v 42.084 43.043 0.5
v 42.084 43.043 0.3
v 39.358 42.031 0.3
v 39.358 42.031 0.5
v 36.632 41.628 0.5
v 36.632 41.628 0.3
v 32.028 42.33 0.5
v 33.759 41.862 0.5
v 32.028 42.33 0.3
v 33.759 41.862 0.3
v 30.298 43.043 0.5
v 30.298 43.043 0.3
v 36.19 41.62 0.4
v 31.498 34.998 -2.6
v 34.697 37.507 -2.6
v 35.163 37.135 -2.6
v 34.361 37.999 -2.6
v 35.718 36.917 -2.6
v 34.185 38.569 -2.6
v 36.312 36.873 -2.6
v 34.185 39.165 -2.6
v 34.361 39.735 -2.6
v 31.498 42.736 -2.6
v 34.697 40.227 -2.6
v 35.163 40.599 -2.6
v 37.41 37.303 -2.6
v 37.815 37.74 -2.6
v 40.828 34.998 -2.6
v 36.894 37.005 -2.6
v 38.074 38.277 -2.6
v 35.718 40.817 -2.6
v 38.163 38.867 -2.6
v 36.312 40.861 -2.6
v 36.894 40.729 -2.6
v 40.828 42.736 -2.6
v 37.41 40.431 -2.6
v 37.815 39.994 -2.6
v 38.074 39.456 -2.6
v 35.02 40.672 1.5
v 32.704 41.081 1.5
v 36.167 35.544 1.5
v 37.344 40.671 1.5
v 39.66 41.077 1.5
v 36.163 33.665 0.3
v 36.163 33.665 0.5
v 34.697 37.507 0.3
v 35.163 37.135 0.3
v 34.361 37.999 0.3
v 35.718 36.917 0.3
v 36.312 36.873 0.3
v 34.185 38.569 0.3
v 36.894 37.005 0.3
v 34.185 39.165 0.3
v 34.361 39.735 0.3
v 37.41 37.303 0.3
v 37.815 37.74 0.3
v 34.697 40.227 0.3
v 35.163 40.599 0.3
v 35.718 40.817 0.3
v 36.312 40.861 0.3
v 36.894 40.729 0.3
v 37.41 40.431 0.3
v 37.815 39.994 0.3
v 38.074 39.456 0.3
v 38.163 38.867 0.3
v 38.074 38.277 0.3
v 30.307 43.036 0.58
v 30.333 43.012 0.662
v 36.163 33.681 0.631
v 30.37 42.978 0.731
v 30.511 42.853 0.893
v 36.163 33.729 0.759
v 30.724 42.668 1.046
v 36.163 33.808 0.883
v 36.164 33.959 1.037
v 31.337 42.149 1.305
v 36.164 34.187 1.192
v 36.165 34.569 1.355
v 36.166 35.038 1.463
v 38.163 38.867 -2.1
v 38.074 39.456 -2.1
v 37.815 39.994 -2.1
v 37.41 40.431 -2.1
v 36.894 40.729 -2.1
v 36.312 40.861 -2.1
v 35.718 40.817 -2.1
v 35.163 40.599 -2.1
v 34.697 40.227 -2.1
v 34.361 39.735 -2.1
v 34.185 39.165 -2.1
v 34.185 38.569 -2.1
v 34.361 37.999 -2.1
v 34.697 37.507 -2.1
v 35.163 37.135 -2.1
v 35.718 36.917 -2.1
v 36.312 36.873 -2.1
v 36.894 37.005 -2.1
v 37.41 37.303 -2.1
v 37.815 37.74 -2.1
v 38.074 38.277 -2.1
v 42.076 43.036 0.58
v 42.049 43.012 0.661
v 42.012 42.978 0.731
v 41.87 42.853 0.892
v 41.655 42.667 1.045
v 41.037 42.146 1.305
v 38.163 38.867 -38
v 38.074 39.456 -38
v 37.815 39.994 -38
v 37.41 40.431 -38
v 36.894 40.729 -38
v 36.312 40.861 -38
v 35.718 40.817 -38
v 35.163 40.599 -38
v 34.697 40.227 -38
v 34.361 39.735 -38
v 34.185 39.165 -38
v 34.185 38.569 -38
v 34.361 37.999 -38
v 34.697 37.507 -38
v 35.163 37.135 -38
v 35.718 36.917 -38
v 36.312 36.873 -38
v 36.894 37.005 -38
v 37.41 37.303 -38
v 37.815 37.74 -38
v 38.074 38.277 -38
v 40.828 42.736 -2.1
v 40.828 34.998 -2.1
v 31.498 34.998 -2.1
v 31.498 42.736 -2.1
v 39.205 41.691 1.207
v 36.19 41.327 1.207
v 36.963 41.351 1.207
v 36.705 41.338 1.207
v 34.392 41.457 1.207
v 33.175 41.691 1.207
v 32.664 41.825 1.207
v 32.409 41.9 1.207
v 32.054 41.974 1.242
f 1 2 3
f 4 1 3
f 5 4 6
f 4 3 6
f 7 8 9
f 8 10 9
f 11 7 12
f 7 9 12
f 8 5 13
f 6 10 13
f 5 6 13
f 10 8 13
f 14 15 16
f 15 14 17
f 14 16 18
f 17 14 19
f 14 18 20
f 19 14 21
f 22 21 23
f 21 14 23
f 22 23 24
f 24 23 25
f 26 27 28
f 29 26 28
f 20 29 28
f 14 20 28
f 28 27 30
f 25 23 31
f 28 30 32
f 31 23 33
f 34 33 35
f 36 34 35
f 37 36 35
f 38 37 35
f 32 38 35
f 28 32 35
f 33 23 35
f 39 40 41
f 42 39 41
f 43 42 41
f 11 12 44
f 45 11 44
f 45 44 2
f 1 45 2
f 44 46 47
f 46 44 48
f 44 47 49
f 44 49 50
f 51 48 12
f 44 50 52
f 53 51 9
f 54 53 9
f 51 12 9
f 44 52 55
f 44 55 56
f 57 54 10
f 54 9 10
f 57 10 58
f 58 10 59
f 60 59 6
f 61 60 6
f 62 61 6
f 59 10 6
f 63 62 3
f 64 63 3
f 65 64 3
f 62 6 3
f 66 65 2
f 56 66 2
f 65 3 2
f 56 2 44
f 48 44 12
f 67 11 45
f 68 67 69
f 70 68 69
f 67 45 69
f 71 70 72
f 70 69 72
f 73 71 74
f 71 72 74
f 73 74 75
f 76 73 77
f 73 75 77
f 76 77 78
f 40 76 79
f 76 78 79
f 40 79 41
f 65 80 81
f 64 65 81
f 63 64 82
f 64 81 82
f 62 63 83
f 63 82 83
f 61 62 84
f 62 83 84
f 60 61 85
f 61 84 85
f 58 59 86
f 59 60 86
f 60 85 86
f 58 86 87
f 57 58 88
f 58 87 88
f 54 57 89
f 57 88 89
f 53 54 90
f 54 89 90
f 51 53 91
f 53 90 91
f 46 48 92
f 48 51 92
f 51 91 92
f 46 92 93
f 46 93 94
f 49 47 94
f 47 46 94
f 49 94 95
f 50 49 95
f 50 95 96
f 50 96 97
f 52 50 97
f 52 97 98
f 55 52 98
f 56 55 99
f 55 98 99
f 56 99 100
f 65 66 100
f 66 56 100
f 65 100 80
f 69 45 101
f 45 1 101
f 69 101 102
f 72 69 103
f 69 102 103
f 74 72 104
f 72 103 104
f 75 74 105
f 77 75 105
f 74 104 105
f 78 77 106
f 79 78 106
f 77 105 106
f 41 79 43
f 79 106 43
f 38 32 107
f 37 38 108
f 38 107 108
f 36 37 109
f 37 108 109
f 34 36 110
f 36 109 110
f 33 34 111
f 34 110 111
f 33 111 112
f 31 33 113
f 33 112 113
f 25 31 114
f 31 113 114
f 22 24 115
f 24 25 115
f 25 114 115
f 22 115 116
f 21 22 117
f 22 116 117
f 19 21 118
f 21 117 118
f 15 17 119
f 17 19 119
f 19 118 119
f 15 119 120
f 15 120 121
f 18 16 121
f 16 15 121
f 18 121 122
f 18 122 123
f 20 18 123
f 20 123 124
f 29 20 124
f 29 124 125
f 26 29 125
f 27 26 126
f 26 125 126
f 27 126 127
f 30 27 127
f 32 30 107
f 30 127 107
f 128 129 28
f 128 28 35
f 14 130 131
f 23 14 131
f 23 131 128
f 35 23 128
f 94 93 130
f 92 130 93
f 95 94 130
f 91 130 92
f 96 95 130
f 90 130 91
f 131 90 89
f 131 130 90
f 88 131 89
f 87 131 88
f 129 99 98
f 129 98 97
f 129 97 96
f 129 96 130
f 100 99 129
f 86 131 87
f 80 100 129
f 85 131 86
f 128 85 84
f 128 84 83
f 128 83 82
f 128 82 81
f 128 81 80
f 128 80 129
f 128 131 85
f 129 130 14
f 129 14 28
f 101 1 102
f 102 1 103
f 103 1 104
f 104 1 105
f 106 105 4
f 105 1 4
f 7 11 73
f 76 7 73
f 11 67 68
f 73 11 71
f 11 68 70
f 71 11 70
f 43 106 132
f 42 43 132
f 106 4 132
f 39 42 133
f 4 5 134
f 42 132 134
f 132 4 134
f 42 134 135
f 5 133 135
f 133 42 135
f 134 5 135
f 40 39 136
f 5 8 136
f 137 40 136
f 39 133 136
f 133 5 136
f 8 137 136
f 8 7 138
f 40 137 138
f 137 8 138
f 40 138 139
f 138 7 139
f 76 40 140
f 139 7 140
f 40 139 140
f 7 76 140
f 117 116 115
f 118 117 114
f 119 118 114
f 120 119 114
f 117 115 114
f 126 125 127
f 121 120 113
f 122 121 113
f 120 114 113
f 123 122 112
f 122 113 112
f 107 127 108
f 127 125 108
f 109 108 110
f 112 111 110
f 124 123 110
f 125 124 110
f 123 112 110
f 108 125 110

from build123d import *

# Parameters (mm, degrees)
BOSS_EXTRUDE1_DEPTH      = 0.5
BOSS_EXTRUDE1_DEPTH_BACK = 38
SKETCH1_R                = 2
BOSS_EXTRUDE2_DEPTH      = 1
BOSS_EXTRUDE2_DEPTH_BACK = 0.2
FILLET1_R                = 1
SKETCH3_W                = 9.33031097
SKETCH3_H                = 7.737675748
BOSS_EXTRUDE3_DEPTH      = 0.5


with BuildPart() as part:
    # Sketch1 → Boss-Extrude1 (new, two sides: drawn at the far end of the back side and taken through both)
    with BuildSketch(Plane.XY.offset(-BOSS_EXTRUDE1_DEPTH_BACK)):
        with Locations((36.163012657, 38.866961635)):
            Circle(SKETCH1_R)
    extrude(amount=BOSS_EXTRUDE1_DEPTH + BOSS_EXTRUDE1_DEPTH_BACK)

    # Sketch2 → Boss-Extrude2 (add, two sides: drawn at the far end of the back side and taken through both)
    with BuildSketch(Plane.XY.offset(0.5).offset(-BOSS_EXTRUDE2_DEPTH_BACK)):
        with BuildLine():
            Line((36.163012657, 33.665102482), (42.084431795, 43.04323939))
            add(Edge.make_bspline(
                [(42.084431795, 43.04323939), (36.188063939, 40.196898594), (30.297901751, 43.04323939)],
                knots=[0, 0, 0, 1, 1, 1], degree=2))
            Line((30.297901751, 43.04323939), (36.163012657, 33.665102482))
        make_face()
    extrude(amount=BOSS_EXTRUDE2_DEPTH + BOSS_EXTRUDE2_DEPTH_BACK)

    # Fillet1
    fillet1_edges = [part.edges().sort_by_distance(p)[0] for p in [
        (33.230457204, 38.354170936, 1.5),
        (39.123722226, 38.354170936, 1.5),
        (36.189615356, 41.620068992, 1.5),
    ]]
    fillet(fillet1_edges, radius=FILLET1_R - 0.0001)  # a hair under: the kernel refuses the full size

    # Sketch3 → Boss-Extrude3 (add)
    with BuildSketch(Plane.XY.offset(-2.1)):
        with Locations((36.163012657, 38.866961635)):
            Rectangle(SKETCH3_W, SKETCH3_H)
    extrude(amount=-BOSS_EXTRUDE3_DEPTH)


solid = part.part
